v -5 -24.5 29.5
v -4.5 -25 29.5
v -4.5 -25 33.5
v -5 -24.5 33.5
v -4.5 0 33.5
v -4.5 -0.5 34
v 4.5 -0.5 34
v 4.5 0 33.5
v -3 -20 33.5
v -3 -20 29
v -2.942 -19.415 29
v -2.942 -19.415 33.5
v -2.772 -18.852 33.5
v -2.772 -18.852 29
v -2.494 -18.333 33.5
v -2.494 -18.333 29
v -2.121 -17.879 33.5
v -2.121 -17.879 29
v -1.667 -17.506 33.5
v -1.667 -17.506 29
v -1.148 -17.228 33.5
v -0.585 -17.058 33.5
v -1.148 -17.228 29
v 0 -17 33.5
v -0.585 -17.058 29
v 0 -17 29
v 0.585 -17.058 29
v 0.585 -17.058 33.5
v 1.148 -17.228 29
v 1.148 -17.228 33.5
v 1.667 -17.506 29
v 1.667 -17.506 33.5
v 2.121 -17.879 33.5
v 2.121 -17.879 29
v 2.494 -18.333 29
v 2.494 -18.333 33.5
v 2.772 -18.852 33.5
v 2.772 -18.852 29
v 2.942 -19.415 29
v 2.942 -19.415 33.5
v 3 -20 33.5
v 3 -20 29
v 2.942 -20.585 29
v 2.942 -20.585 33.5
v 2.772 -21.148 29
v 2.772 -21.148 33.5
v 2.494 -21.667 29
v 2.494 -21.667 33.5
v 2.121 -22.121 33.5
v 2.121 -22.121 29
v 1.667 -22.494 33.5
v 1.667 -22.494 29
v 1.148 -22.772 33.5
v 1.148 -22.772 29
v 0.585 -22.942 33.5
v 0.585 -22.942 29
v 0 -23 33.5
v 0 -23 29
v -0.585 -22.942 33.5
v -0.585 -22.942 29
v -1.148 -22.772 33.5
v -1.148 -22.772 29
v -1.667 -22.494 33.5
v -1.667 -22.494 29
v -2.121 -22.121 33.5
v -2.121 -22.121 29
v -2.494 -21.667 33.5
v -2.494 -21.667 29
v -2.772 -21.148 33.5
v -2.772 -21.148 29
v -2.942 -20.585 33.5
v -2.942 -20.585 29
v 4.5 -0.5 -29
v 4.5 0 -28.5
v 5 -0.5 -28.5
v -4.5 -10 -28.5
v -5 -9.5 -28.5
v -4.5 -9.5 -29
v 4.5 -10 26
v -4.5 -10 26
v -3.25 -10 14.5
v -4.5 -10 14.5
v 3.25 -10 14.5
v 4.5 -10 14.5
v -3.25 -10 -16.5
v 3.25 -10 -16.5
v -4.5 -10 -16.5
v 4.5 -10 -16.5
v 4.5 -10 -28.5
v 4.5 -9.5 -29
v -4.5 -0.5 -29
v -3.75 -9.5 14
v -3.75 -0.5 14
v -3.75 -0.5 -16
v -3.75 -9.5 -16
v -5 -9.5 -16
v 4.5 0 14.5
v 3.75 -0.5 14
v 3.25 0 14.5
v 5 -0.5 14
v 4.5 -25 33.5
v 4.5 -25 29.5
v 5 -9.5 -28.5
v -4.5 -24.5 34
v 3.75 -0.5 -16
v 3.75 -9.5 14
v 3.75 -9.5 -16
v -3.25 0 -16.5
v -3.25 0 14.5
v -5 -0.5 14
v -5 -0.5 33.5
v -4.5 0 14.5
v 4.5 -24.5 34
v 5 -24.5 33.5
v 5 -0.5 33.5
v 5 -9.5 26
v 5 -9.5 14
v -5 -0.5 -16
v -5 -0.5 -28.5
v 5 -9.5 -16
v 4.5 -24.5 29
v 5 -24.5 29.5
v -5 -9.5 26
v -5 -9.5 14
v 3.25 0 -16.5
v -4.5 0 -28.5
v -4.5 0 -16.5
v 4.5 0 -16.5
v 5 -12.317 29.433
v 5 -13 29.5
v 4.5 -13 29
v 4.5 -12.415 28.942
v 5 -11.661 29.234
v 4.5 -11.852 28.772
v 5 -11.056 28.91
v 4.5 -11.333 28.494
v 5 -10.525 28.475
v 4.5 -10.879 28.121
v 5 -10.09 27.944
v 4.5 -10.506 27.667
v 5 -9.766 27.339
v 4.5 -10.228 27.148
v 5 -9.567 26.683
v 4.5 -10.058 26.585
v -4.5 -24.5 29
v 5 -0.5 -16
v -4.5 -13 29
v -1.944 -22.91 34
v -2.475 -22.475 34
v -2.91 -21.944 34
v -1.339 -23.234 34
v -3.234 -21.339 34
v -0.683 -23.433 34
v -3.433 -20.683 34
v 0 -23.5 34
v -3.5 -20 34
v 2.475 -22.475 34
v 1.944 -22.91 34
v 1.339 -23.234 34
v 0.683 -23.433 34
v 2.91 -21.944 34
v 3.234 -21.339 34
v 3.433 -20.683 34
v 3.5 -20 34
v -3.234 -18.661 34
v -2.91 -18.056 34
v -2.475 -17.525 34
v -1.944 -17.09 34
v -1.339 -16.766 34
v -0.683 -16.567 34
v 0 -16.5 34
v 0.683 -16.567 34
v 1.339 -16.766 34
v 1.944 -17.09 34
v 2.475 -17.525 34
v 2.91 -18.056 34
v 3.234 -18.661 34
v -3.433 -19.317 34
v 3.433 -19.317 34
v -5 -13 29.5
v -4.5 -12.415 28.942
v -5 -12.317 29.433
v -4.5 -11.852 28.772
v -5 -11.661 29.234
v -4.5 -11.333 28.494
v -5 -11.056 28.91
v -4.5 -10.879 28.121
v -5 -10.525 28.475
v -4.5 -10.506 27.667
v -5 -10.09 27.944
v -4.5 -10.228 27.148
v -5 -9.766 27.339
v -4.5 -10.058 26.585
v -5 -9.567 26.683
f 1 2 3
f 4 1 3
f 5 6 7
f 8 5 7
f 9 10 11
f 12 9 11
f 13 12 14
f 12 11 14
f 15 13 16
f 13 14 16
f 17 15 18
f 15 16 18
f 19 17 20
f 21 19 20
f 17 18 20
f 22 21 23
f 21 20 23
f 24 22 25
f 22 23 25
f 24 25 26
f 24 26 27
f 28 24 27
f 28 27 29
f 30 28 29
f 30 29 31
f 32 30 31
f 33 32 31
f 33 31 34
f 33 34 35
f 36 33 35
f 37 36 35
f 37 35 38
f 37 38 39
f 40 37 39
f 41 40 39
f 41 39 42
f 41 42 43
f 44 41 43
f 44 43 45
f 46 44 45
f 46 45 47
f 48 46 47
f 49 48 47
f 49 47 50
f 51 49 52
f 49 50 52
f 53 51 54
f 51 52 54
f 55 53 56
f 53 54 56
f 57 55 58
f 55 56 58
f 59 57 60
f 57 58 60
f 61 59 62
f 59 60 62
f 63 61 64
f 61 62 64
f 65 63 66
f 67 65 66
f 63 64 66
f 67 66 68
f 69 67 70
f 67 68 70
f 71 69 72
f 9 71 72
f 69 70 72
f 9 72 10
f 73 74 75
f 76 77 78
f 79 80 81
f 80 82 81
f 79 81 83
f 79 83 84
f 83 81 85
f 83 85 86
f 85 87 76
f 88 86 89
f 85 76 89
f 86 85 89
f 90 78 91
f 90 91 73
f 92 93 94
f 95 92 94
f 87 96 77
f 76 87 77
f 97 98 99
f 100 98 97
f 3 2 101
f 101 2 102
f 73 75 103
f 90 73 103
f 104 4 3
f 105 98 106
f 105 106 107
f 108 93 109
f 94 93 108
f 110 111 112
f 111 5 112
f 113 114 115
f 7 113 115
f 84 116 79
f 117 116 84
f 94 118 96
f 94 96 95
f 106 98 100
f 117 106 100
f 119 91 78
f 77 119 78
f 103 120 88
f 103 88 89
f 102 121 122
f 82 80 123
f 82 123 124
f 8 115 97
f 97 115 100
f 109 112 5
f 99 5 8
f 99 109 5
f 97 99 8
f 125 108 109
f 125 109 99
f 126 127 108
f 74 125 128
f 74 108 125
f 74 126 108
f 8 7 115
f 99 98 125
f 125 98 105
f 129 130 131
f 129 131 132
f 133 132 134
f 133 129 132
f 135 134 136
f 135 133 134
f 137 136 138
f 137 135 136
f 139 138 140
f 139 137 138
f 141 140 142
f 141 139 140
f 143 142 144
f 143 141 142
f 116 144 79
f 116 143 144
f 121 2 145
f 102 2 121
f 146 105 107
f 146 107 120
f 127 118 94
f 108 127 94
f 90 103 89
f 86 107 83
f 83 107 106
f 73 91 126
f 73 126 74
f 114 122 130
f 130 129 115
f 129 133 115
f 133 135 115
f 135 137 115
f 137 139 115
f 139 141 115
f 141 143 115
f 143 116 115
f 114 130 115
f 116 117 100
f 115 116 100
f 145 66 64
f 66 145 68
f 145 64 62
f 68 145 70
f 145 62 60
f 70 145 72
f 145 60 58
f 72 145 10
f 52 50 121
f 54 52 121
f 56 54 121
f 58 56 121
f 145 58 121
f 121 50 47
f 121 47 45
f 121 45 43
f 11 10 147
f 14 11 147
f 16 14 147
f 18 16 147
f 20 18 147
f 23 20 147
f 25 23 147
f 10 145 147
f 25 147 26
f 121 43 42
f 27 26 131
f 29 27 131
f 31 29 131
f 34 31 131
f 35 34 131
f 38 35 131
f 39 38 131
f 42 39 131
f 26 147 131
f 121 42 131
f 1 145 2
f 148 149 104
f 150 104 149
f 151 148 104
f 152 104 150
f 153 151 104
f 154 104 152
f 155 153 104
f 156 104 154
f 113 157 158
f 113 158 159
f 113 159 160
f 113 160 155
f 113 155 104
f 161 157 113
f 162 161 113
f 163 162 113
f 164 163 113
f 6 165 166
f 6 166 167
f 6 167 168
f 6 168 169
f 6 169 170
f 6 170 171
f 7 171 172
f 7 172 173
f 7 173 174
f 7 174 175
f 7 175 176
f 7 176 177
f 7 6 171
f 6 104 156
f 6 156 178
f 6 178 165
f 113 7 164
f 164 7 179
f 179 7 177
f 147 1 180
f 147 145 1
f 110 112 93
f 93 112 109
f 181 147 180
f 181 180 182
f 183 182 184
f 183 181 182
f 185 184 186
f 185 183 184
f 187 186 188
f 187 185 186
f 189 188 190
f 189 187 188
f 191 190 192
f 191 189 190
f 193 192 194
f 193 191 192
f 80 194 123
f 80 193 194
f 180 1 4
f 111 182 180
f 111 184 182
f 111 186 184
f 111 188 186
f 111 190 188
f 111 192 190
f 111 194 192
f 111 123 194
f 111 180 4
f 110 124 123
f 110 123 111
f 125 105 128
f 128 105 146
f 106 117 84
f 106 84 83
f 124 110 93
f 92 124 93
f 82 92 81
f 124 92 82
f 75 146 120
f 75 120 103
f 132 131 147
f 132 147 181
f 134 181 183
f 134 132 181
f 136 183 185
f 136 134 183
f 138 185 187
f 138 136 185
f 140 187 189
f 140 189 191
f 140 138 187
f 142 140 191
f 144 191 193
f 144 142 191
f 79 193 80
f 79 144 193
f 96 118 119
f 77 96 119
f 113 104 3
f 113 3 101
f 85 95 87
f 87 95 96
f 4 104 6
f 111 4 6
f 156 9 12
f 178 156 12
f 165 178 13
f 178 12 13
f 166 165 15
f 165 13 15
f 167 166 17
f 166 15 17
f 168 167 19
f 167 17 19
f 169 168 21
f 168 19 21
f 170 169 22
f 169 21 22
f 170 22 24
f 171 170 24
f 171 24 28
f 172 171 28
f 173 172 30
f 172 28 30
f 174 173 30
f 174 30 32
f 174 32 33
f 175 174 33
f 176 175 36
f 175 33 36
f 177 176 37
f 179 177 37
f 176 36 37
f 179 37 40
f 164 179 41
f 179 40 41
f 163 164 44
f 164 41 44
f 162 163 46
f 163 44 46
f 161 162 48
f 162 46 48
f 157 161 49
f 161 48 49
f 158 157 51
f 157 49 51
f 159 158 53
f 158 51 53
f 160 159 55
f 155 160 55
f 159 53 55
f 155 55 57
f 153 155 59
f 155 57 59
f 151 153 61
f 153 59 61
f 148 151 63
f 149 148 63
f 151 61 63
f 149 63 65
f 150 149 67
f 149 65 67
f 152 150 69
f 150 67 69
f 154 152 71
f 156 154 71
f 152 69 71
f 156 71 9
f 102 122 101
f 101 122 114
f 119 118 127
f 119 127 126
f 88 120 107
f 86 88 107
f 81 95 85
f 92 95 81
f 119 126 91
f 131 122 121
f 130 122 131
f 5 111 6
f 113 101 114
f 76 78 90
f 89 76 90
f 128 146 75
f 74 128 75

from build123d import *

# Parameters (mm, degrees)
SKETCH1_W            = 10
SKETCH1_H            = 58
BOSS_EXTRUDE1_DEPTH  = 10
CUT_EXTRUDE1_REACH   = 33.081
SKETCH2_W            = 1.25
SKETCH2_H            = 30
SKETCH3_W            = 10
SKETCH3_H            = 25
BOSS_EXTRUDE2_DEPTH  = 5
FILLET1_R            = 3
M5_CLEARANCE_HOLE1_D = 6
CHAMFER1_SIZE        = 0.5


with BuildPart() as part:
    # Sketch1 → Boss-Extrude1 (new body)
    with BuildSketch(Plane(origin=(0, 0, 0), x_dir=(1, 0, 0), z_dir=(0, 1, 0))):
        Rectangle(SKETCH1_W, SKETCH1_H)
    extrude(amount=-BOSS_EXTRUDE1_DEPTH)

    # Sketch2 → Cut-Extrude1 (cut, up to next)
    with BuildSketch(Plane(origin=(0, 0, 0), x_dir=(1, 0, 0), z_dir=(0, 1, 0)), mode=Mode.PRIVATE) as cut_extrude1_sk1:
        with Locations((-4.375, 1)):
            Rectangle(SKETCH2_W, SKETCH2_H)
    cut_extrude1_tool1 = extrude(cut_extrude1_sk1.sketch, amount=-CUT_EXTRUDE1_REACH, mode=Mode.PRIVATE) & part.part
    # Sketch2 → Cut-Extrude1 (cut, up to next)
    with BuildSketch(Plane(origin=(0, 0, 0), x_dir=(1, 0, 0), z_dir=(0, 1, 0)), mode=Mode.PRIVATE) as cut_extrude1_sk2:
        with Locations((4.375, 1)):
            Rectangle(SKETCH2_W, SKETCH2_H)
    cut_extrude1_tool2 = extrude(cut_extrude1_sk2.sketch, amount=-CUT_EXTRUDE1_REACH, mode=Mode.PRIVATE) & part.part
    add(cut_extrude1_tool1.solids().sort_by_distance((-4.375, 0, -1))[0], mode=Mode.SUBTRACT)
    add(cut_extrude1_tool2.solids().sort_by_distance((4.375, 0, -1))[0], mode=Mode.SUBTRACT)

    # Sketch3 → Boss-Extrude2 (add)
    with BuildSketch(Plane.XY.offset(29)):
        with Locations((0, -12.5)):
            Rectangle(SKETCH3_W, SKETCH3_H)
    extrude(amount=BOSS_EXTRUDE2_DEPTH)

    # Fillet1
    fillet1_edges = [part.edges().sort_by_distance(p)[0] for p in [
        (0, -10, 29),
    ]]
    fillet(fillet1_edges, radius=FILLET1_R)

    # M5 Clearance Hole1 (through all)
    with Locations(Plane.XY.offset(34)):
        with Locations((0, -20)):
            Hole(M5_CLEARANCE_HOLE1_D / 2)

    # Chamfer1
    chamfer1_edges = [part.edges().sort_by_distance(p)[0] for p in [
        (-5, -10, -22.5),
        (5, 0, -22.5),
        (-5, 0, 24),
        (5, -10, -22.5),
        (-5, -10, 20),
        (-4.375, -10, -16),
        (-3.75, -10, -1),
        (-4.375, -10, 14),
        (-4.375, 0, 14),
        (-3.75, 0, -1),
        (-4.375, 0, -16),
        (4.375, -10, 14),
        (3.75, -10, -1),
        (4.375, -10, -16),
        (4.375, 0, -16),
        (3.75, 0, -1),
        (4.375, 0, 14),
        (0, -25, 29),
        (-5, -25, 31.5),
        (5, -19, 29),
        (5, -25, 31.5),
        (-5, -12.5, 34),
        (0, -25, 34),
        (5, -12.5, 34),
        (0, 0, 34),
        (-5, 0, -22.5),
        (0, 0, -29),
        (-5, -19, 29),
        (5, -10, 20),
        (5, -10.878679656, 28.121320344),
        (-5, -10.878679656, 28.121320344),
        (5, 0, 24),
        (3, -20, 34),
        (-5, -5, -29),
        (5, -5, -29),
        (0, -10, -29),
    ]]
    chamfer(chamfer1_edges, length=CHAMFER1_SIZE)


solid = part.part
